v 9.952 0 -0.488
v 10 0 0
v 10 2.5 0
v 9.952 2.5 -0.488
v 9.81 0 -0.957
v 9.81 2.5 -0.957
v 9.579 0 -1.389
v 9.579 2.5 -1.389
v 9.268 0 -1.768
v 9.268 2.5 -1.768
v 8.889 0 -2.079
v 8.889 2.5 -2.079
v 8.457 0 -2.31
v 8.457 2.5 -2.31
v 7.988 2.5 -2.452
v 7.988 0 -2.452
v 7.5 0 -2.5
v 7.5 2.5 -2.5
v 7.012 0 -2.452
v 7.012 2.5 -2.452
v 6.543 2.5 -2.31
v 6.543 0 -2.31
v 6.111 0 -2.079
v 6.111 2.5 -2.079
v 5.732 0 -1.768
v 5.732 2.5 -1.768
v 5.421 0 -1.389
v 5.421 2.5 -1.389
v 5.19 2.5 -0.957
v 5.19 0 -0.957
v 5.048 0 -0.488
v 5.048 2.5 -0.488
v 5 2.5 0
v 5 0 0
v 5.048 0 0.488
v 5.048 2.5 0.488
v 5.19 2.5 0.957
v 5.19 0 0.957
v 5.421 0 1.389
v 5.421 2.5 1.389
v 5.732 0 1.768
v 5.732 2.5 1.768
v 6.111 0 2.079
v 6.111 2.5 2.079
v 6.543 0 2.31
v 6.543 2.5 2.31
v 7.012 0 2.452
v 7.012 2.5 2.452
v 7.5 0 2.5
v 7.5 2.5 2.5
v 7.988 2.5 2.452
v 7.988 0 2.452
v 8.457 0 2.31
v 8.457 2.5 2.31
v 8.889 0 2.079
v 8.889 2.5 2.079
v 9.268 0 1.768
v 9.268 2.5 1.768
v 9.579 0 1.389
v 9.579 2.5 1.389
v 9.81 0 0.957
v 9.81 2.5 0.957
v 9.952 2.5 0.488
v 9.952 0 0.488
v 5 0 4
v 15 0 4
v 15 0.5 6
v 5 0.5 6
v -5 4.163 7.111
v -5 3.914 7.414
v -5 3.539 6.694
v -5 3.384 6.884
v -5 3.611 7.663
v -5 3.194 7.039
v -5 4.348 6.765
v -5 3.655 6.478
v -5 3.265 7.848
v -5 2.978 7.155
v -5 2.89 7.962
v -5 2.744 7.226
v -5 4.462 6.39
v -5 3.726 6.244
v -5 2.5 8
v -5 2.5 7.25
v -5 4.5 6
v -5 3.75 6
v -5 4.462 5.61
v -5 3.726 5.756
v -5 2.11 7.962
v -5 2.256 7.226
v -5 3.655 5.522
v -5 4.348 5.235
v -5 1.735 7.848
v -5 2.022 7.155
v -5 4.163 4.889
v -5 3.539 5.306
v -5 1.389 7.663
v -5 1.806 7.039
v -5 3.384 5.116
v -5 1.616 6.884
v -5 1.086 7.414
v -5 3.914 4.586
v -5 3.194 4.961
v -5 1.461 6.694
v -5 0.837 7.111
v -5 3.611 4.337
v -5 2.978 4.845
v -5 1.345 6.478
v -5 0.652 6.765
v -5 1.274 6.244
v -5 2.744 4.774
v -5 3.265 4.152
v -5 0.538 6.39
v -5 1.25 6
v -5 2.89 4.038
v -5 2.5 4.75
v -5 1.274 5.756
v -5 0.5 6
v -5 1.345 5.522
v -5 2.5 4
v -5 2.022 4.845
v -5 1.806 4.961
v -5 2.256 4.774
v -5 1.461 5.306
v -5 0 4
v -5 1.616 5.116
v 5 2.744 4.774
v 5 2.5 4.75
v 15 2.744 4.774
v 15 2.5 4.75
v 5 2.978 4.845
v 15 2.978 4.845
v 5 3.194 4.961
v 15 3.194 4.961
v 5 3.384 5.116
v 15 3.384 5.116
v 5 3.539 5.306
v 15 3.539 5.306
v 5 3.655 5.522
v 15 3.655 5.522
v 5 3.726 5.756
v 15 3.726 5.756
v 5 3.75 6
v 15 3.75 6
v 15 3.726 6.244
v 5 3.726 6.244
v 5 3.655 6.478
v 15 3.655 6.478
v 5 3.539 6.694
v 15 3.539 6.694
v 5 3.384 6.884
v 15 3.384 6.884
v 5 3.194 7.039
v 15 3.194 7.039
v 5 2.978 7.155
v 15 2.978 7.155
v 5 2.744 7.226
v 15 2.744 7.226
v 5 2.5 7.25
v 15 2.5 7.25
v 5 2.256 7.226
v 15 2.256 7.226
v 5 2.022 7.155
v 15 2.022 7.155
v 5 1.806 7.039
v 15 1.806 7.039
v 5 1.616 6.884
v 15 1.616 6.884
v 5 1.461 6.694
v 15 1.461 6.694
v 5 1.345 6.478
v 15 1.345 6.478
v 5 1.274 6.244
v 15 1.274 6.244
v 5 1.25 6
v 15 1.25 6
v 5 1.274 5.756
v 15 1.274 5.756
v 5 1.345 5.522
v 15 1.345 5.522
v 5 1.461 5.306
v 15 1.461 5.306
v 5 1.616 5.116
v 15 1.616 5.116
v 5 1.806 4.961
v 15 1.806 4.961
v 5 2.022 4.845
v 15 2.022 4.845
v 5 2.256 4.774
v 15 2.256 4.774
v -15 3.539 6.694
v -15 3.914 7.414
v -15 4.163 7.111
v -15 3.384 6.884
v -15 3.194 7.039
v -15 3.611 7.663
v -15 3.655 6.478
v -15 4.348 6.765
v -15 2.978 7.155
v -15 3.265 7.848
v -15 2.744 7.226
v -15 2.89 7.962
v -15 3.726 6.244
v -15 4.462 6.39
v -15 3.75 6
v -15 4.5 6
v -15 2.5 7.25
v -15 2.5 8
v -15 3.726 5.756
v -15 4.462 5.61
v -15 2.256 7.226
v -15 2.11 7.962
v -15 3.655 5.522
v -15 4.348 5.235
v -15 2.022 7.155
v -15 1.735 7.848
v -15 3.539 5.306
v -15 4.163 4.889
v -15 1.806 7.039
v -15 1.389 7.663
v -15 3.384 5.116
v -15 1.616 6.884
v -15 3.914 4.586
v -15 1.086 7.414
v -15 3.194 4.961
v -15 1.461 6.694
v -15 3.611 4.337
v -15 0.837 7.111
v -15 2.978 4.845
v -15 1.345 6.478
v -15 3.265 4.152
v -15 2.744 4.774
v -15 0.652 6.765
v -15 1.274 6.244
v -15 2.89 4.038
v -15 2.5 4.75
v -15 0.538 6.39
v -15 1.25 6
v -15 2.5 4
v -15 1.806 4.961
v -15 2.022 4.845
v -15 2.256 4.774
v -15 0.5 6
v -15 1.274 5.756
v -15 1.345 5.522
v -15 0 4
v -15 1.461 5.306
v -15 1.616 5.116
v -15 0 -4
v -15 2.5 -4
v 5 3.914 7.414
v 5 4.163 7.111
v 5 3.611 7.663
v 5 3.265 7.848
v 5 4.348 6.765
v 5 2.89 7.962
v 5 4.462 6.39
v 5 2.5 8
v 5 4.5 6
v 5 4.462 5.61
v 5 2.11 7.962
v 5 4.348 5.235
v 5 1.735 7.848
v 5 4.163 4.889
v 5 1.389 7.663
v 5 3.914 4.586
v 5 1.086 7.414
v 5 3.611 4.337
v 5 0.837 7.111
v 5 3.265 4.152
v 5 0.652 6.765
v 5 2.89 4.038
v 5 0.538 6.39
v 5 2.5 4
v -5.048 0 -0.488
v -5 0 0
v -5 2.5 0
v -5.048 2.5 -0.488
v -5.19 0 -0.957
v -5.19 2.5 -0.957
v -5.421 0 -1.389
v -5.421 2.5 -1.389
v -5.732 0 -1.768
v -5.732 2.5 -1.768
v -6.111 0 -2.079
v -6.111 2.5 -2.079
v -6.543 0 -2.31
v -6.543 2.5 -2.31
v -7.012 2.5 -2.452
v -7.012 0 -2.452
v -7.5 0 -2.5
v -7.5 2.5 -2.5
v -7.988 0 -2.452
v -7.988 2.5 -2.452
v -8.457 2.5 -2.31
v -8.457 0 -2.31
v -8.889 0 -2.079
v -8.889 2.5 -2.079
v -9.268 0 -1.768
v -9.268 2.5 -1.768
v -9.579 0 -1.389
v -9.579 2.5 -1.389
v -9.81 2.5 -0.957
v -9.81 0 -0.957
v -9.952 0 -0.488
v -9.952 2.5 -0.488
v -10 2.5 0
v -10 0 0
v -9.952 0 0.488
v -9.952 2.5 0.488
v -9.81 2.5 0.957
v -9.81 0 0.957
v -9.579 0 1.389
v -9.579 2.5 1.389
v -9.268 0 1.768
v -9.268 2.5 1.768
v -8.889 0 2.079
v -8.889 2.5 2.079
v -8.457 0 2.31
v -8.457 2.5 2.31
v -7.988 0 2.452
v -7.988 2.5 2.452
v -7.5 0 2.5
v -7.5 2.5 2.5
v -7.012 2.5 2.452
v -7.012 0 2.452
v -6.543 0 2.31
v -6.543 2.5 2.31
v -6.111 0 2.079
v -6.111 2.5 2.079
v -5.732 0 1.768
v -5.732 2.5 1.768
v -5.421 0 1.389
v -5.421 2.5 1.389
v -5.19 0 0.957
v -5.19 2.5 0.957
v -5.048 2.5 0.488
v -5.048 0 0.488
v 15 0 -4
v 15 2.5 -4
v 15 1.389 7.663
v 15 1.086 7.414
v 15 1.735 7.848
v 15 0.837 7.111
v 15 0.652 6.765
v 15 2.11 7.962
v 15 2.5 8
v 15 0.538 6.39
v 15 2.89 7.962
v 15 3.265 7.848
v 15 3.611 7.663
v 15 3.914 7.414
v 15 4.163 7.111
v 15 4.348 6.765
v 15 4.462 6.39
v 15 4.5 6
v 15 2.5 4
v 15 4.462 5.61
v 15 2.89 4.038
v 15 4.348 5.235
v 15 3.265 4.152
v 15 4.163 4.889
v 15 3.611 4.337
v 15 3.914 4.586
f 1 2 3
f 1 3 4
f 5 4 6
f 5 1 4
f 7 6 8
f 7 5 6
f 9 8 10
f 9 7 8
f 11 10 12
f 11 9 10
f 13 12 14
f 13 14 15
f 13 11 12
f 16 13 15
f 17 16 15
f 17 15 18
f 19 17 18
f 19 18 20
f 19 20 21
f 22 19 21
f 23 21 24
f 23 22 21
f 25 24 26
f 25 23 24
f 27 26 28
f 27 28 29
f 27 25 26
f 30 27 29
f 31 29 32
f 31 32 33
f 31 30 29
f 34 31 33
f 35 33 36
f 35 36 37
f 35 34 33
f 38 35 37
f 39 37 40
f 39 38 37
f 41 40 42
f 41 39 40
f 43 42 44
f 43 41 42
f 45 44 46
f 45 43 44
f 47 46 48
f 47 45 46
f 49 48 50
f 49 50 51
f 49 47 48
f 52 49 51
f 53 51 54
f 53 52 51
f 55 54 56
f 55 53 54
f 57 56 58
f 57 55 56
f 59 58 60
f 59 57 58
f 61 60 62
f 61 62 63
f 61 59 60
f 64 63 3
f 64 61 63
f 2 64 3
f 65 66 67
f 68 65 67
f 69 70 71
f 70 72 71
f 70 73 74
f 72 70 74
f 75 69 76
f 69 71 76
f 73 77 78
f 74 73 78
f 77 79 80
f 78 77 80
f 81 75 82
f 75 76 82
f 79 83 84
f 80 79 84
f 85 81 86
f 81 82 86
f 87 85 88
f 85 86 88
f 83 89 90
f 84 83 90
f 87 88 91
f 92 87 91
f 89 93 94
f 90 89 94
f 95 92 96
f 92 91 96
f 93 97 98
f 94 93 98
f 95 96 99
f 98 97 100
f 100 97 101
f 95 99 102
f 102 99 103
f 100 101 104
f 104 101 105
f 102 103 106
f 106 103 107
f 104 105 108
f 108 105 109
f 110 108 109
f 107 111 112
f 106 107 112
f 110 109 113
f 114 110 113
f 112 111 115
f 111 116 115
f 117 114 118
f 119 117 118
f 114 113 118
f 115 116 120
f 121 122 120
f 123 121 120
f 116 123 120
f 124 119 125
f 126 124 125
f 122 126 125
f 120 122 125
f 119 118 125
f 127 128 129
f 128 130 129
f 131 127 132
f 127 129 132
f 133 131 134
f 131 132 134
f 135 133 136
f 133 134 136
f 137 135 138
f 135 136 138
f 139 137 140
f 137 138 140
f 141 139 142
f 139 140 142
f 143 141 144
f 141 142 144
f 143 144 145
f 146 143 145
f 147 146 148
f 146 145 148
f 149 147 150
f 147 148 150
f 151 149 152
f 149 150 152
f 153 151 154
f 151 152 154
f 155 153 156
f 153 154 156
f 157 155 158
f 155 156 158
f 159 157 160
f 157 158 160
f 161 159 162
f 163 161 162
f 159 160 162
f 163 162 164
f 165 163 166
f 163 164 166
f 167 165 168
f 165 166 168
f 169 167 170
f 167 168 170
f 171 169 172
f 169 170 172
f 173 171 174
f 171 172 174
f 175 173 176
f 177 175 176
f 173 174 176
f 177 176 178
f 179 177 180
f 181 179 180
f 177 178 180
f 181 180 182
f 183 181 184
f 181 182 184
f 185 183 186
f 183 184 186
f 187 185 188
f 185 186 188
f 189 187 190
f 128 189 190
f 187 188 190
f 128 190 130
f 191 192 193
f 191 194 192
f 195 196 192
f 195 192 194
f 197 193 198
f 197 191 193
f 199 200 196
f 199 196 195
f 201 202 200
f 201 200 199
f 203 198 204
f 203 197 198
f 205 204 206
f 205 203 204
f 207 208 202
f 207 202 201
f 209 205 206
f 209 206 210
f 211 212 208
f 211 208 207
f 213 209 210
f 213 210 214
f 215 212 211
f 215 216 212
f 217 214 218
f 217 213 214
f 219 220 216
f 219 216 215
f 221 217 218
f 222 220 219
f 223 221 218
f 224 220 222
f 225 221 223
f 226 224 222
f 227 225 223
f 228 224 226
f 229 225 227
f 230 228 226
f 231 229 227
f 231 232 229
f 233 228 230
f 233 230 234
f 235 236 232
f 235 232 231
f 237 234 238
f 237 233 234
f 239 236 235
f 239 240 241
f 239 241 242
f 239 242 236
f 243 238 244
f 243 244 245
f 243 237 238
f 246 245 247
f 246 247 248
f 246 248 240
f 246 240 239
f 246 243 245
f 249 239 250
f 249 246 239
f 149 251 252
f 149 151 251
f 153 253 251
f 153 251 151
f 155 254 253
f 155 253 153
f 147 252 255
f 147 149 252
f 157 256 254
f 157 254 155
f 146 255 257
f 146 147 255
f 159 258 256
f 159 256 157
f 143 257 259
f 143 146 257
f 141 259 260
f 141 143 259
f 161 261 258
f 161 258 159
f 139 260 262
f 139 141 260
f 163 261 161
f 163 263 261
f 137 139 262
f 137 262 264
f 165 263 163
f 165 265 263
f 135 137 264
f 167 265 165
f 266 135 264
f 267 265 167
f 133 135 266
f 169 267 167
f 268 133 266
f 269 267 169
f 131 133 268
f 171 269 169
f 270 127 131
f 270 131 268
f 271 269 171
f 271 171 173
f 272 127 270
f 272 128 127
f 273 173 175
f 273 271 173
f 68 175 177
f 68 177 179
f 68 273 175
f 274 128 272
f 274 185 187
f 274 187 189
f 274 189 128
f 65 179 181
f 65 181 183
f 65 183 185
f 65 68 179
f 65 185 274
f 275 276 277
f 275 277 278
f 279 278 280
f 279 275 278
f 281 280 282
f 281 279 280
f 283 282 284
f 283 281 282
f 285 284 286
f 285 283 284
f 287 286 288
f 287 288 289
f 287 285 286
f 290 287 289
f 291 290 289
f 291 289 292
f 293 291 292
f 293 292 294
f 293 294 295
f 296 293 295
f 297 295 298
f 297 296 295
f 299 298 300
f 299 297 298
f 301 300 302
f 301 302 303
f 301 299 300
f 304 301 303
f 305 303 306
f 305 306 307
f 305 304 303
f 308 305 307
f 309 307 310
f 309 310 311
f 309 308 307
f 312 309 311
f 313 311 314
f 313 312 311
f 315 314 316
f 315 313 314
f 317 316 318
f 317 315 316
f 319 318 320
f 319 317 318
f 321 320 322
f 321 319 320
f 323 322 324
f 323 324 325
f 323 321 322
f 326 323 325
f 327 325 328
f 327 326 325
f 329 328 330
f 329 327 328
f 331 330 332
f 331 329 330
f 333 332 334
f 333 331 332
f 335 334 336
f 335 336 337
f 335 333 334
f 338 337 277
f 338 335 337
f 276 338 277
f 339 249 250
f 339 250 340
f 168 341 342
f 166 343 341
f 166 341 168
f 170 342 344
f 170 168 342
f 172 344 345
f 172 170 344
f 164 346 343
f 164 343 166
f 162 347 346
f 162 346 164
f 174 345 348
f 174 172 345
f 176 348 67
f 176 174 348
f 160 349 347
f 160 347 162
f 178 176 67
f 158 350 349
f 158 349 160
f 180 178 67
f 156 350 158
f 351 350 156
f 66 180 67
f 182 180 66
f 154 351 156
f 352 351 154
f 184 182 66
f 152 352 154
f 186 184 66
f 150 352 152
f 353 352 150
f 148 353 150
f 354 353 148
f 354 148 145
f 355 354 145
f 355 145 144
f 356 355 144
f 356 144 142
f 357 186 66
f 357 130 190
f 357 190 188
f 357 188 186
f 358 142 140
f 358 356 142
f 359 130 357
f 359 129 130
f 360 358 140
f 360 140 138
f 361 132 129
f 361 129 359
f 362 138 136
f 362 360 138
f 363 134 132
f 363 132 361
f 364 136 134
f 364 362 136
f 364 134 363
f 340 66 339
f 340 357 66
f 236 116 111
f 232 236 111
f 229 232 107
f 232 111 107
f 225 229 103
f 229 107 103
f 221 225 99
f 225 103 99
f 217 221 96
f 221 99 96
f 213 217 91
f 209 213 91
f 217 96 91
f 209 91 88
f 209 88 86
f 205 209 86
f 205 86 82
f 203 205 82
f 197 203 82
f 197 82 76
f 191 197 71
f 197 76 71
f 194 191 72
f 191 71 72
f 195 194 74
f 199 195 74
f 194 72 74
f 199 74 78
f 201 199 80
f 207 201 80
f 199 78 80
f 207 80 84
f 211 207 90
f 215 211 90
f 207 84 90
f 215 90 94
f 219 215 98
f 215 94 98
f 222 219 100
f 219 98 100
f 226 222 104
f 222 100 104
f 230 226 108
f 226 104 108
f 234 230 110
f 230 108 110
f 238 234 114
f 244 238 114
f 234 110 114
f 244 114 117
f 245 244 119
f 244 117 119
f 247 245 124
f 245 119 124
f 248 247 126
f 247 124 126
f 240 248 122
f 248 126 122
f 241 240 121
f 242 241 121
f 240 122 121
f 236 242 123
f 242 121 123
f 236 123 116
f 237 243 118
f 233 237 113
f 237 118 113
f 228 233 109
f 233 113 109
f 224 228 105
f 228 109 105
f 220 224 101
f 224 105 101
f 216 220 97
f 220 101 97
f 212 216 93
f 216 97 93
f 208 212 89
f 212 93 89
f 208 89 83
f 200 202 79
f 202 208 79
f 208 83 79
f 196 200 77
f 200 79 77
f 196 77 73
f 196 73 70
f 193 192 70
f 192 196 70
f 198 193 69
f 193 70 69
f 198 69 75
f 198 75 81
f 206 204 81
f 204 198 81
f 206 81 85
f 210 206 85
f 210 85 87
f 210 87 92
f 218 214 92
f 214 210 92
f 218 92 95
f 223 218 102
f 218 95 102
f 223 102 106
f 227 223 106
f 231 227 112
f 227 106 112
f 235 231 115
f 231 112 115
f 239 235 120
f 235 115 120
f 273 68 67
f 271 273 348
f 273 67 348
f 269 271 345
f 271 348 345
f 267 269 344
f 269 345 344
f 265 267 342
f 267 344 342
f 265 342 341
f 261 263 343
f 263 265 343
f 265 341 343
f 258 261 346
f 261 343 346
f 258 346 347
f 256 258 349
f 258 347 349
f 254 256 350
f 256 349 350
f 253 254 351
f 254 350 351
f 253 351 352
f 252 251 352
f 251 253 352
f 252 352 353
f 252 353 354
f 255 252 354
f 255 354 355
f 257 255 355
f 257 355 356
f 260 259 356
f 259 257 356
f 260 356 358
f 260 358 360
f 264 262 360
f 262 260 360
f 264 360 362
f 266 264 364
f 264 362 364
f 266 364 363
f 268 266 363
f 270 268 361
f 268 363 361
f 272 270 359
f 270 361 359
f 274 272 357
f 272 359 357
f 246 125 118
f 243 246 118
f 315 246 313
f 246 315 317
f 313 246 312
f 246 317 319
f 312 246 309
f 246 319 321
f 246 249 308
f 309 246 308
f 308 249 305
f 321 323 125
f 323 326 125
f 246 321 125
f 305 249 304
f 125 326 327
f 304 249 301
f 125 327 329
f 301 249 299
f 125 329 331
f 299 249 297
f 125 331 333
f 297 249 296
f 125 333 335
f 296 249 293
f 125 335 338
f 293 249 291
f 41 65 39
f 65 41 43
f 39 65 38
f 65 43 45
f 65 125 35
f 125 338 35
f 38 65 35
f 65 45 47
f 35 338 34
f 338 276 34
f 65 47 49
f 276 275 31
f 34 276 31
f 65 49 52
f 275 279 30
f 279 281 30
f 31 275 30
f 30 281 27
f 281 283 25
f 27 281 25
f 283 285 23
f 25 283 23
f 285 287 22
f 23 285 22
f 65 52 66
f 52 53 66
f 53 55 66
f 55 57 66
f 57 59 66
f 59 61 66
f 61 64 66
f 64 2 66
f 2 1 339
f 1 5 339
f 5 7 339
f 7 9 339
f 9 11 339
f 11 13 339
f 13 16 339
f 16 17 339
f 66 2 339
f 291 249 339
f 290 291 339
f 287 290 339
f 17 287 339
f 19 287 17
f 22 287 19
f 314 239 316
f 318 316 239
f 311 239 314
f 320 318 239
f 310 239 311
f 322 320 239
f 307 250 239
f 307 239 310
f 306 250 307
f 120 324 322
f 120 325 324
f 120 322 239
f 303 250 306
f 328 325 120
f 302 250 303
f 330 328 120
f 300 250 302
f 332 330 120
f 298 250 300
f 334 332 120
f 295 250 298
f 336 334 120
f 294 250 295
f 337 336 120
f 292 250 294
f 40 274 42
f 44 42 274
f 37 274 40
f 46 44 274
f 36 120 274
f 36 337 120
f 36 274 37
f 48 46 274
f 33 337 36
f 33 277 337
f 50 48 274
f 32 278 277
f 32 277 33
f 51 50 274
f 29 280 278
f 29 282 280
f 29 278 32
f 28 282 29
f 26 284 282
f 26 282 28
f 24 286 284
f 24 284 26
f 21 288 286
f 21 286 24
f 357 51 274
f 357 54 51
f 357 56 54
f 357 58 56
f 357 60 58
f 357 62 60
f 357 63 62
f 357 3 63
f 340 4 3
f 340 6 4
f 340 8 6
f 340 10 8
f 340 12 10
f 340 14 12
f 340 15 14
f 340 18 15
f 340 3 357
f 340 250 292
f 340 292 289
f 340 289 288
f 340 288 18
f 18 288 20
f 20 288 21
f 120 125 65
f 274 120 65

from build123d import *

# Parameters (mm, degrees)
SKETCH1_W                       = 30
SKETCH1_H                       = 8
SKETCH1_R                       = 2.5
BOSS_EXTRUDE1_DEPTH             = 2.5
BOSS_EXTRUDE2_REACH             = 17
SKETCH2_R                       = 1.25
BOSS_EXTRUDE2_DIRECTION_2_REACH = 17
SKETCH4_W                       = 10
SKETCH4_H                       = 4
CUT_EXTRUDE2_DEPTH              = 5.5


with BuildPart() as part:
    # Sketch1 → Boss-Extrude1 (new body)
    with BuildSketch(Plane(origin=(0, 0, 0), x_dir=(1, 0, 0), z_dir=(0, 1, 0))):
        Rectangle(SKETCH1_W, SKETCH1_H)
        with Locations((-7.5, 0)):
            Circle(SKETCH1_R, mode=Mode.SUBTRACT)
        with Locations((7.5, 0)):
            Circle(SKETCH1_R, mode=Mode.SUBTRACT)
    extrude(amount=BOSS_EXTRUDE1_DEPTH)

    # Boss-Extrude2: up to this face of the body (flat: up to its plane)
    boss_extrude2_end = Plane(part.part.faces().sort_by_distance((15, 1.25, 0))[0])
    # Sketch2 → Boss-Extrude2 (add, up to the picked face)
    with BuildSketch(Plane(origin=(0, 0, 0), x_dir=(0, 0, -1), z_dir=(1, 0, 0)), mode=Mode.PRIVATE) as boss_extrude2_sk1:
        with BuildLine():
            Line((-4, 2.5), (-4, 0))
            Line((-4, 0), (-6, 0.5))
            ThreePointArc((-6, 0.5), (-7.414213562, 3.914213562), (-4, 2.5))
        make_face()
        with Locations((-6, 2.5)):
            Circle(SKETCH2_R, mode=Mode.SUBTRACT)
    boss_extrude2_tool1 = split(extrude(boss_extrude2_sk1.sketch, amount=BOSS_EXTRUDE2_REACH, mode=Mode.PRIVATE), bisect_by=boss_extrude2_end, keep=Keep.BOTH, mode=Mode.PRIVATE)
    add(boss_extrude2_tool1.solids().sort_by_distance((0, 1.25, 4.060208))[0])

    # Boss-Extrude2 direction 2: up to this face of the body (flat: up to its plane)
    boss_extrude2_direction_2_end = Plane(part.part.faces().sort_by_distance((-15, 1.25, 0))[0])
    # Sketch2 → Boss-Extrude2 direction 2 (add, up to the picked face)
    with BuildSketch(Plane(origin=(0, 0, 0), x_dir=(0, 0, -1), z_dir=(1, 0, 0)), mode=Mode.PRIVATE) as boss_extrude2_direction_2_sk1:
        with BuildLine():
            Line((-4, 2.5), (-4, 0))
            Line((-4, 0), (-6, 0.5))
            ThreePointArc((-6, 0.5), (-7.414213562, 3.914213562), (-4, 2.5))
        make_face()
        with Locations((-6, 2.5)):
            Circle(SKETCH2_R, mode=Mode.SUBTRACT)
    boss_extrude2_direction_2_tool1 = split(extrude(boss_extrude2_direction_2_sk1.sketch, amount=-BOSS_EXTRUDE2_DIRECTION_2_REACH, mode=Mode.PRIVATE), bisect_by=boss_extrude2_direction_2_end, keep=Keep.BOTH, mode=Mode.PRIVATE)
    add(boss_extrude2_direction_2_tool1.solids().sort_by_distance((0, 1.25, 4.060208))[0])

    # Sketch4 → Cut-Extrude2 (cut, through all)
    with BuildSketch(Plane(origin=(0, 0, 0), x_dir=(1, 0, 0), z_dir=(0, 1, 0))):
        with Locations((0, -6)):
            Rectangle(SKETCH4_W, SKETCH4_H)
    extrude(amount=CUT_EXTRUDE2_DEPTH, mode=Mode.SUBTRACT)


solid = part.part
